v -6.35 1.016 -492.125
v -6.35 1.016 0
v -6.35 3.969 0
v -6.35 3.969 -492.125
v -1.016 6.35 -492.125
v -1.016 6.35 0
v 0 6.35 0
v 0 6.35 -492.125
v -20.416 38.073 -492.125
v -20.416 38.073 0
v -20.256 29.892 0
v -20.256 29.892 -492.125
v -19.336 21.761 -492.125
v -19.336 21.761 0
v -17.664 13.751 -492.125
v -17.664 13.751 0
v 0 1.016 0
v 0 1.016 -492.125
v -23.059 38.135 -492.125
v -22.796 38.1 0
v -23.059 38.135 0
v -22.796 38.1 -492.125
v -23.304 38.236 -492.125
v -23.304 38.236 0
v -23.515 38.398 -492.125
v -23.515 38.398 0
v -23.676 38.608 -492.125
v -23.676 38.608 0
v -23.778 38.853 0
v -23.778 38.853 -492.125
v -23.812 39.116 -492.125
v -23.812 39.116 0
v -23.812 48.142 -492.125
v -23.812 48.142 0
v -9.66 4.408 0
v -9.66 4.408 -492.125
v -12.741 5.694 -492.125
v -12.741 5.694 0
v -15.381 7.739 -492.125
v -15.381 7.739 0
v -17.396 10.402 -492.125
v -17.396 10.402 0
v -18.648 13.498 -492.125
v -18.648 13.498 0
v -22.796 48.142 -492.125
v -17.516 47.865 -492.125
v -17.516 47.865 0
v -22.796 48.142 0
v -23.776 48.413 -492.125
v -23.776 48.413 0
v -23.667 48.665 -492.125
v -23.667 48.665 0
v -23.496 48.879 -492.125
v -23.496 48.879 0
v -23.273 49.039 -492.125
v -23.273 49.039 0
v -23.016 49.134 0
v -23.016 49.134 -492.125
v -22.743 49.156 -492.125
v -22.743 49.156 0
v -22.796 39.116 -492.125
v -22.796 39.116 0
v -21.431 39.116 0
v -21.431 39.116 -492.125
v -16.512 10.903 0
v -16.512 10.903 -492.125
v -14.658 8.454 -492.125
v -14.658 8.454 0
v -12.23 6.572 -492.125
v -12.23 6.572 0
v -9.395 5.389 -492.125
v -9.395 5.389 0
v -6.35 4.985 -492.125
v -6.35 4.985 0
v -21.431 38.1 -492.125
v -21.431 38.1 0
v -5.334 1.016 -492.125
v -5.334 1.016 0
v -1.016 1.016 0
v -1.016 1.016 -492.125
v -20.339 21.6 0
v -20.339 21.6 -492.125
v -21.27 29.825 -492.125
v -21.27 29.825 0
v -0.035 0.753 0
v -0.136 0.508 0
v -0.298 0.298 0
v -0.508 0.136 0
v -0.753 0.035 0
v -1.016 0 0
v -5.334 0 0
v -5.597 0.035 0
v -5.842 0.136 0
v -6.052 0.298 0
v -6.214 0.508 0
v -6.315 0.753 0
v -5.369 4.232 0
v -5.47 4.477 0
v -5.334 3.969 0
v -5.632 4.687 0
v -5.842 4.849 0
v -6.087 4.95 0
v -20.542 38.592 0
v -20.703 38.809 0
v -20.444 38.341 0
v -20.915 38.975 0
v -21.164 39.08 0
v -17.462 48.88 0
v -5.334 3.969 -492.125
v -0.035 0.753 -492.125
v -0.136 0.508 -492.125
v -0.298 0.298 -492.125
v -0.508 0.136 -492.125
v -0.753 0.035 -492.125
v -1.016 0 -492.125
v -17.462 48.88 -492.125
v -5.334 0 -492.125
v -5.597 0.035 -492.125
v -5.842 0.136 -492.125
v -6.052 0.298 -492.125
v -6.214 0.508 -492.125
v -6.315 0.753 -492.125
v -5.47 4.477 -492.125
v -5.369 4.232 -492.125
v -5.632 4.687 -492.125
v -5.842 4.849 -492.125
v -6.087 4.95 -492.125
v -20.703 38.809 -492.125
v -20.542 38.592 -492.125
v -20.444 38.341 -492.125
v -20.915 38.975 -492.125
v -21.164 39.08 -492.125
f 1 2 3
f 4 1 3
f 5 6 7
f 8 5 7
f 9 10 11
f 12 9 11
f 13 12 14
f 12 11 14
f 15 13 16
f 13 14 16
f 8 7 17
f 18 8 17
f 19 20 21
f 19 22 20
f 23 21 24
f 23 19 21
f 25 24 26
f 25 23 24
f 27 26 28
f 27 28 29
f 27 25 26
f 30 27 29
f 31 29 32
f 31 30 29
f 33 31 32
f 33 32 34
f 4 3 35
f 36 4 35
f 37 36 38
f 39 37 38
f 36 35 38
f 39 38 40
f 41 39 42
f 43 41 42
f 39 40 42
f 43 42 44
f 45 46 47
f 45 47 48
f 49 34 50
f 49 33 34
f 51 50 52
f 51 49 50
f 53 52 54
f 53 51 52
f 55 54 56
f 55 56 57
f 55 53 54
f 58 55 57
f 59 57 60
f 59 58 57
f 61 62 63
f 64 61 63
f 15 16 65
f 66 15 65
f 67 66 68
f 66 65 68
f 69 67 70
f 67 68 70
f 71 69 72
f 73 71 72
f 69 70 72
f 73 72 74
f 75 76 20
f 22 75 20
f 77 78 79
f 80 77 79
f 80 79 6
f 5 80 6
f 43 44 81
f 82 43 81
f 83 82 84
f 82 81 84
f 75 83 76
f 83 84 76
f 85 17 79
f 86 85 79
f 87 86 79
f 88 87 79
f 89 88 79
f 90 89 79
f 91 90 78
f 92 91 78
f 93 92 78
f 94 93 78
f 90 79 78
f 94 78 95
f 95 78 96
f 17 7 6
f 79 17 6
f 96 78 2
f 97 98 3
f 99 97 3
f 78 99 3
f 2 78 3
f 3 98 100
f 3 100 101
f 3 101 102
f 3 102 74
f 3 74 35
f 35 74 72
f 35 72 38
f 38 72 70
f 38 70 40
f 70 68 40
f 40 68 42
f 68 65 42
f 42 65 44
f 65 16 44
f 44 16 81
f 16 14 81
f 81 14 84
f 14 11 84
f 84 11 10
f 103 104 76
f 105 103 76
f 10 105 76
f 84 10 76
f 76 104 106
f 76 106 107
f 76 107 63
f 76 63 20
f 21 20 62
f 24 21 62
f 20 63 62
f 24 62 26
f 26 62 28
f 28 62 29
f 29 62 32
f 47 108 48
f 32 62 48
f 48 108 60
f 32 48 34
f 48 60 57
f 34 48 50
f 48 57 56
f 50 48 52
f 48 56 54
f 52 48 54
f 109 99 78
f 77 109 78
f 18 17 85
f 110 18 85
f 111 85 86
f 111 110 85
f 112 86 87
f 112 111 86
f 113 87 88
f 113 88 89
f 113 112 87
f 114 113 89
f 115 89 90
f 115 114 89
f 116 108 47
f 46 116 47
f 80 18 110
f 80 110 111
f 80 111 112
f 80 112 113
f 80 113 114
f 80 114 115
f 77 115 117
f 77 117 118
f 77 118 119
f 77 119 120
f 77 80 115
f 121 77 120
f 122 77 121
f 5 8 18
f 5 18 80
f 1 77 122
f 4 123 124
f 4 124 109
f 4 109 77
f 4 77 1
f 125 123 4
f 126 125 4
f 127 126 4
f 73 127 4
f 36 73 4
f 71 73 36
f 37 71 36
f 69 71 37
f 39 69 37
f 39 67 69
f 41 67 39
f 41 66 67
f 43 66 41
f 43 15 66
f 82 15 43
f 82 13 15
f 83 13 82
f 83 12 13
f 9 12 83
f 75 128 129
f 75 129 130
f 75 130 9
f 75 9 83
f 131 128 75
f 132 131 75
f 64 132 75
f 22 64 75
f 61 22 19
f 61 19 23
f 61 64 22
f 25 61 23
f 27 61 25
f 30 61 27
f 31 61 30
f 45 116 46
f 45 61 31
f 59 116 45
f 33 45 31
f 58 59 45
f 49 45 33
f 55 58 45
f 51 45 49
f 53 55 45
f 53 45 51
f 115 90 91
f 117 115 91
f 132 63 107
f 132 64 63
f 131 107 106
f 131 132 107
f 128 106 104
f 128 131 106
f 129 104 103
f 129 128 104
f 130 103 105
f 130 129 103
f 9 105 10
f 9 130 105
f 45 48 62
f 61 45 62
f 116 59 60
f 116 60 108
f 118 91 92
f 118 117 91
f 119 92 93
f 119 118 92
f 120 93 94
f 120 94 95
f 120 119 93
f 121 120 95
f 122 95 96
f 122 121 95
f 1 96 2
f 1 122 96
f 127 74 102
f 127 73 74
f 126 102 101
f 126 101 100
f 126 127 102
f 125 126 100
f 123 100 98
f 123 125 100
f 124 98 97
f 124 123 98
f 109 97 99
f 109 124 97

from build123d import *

# Parameters (mm, degrees)
EXTRUDE_THIN1_DEPTH = 492.125
FILLET1_R           = 1.016


with BuildPart() as part:
    # Sketch1 → Extrude-Thin1 (new body)
    with BuildSketch(Plane.XY):
        with BuildLine():
            Line((0, 6.35), (0, 0))
            Line((0, 0), (-6.35, 0))
            Line((-6.35, 0), (-6.35, 3.96875))
            ThreePointArc((-6.35, 3.96875), (-14.128687, 6.629724), (-18.647706, 13.497563))
            ThreePointArc((-18.647706, 13.497563), (-20.900169, 25.701402), (-21.43125, 38.1))
            Line((-21.43125, 38.1), (-23.8125, 38.1))
            Line((-23.8125, 38.1), (-23.8125, 49.2125))
            Line((-23.8125, 49.2125), (-17.4625, 48.879711))
            Line((-17.4625, 48.879711), (-17.515673, 47.865103))
            Line((-17.515673, 47.865103), (-22.7965, 48.141859))
            Line((-22.7965, 48.141859), (-22.7965, 39.116))
            Line((-22.7965, 39.116), (-20.381189, 39.116))
            ThreePointArc((-20.381189, 39.116), (-19.947758, 26.334511), (-17.66389, 13.751258))
            ThreePointArc((-17.66389, 13.751258), (-13.09767, 7.130154), (-5.334, 5.029008))
            Line((-5.334, 5.029008), (-5.334, 1.016))
            Line((-5.334, 1.016), (-1.016, 1.016))
            Line((-1.016, 1.016), (-1.016, 6.35))
            Line((-1.016, 6.35), (0, 6.35))
        make_face()
    extrude(amount=-EXTRUDE_THIN1_DEPTH)

    # Fillet1
    fillet1_edges = [part.edges().sort_by_distance(p)[0] for p in [
        (-20.381189, 39.116, -246.0625),
        (-5.334, 5.029008, -246.0625),
        (0, 0, -246.0625),
        (-6.35, 0, -246.0625),
        (-23.8125, 38.1, -246.0625),
        (-23.8125, 49.2125, -246.0625),
    ]]
    fillet(fillet1_edges, radius=FILLET1_R)


solid = part.part
